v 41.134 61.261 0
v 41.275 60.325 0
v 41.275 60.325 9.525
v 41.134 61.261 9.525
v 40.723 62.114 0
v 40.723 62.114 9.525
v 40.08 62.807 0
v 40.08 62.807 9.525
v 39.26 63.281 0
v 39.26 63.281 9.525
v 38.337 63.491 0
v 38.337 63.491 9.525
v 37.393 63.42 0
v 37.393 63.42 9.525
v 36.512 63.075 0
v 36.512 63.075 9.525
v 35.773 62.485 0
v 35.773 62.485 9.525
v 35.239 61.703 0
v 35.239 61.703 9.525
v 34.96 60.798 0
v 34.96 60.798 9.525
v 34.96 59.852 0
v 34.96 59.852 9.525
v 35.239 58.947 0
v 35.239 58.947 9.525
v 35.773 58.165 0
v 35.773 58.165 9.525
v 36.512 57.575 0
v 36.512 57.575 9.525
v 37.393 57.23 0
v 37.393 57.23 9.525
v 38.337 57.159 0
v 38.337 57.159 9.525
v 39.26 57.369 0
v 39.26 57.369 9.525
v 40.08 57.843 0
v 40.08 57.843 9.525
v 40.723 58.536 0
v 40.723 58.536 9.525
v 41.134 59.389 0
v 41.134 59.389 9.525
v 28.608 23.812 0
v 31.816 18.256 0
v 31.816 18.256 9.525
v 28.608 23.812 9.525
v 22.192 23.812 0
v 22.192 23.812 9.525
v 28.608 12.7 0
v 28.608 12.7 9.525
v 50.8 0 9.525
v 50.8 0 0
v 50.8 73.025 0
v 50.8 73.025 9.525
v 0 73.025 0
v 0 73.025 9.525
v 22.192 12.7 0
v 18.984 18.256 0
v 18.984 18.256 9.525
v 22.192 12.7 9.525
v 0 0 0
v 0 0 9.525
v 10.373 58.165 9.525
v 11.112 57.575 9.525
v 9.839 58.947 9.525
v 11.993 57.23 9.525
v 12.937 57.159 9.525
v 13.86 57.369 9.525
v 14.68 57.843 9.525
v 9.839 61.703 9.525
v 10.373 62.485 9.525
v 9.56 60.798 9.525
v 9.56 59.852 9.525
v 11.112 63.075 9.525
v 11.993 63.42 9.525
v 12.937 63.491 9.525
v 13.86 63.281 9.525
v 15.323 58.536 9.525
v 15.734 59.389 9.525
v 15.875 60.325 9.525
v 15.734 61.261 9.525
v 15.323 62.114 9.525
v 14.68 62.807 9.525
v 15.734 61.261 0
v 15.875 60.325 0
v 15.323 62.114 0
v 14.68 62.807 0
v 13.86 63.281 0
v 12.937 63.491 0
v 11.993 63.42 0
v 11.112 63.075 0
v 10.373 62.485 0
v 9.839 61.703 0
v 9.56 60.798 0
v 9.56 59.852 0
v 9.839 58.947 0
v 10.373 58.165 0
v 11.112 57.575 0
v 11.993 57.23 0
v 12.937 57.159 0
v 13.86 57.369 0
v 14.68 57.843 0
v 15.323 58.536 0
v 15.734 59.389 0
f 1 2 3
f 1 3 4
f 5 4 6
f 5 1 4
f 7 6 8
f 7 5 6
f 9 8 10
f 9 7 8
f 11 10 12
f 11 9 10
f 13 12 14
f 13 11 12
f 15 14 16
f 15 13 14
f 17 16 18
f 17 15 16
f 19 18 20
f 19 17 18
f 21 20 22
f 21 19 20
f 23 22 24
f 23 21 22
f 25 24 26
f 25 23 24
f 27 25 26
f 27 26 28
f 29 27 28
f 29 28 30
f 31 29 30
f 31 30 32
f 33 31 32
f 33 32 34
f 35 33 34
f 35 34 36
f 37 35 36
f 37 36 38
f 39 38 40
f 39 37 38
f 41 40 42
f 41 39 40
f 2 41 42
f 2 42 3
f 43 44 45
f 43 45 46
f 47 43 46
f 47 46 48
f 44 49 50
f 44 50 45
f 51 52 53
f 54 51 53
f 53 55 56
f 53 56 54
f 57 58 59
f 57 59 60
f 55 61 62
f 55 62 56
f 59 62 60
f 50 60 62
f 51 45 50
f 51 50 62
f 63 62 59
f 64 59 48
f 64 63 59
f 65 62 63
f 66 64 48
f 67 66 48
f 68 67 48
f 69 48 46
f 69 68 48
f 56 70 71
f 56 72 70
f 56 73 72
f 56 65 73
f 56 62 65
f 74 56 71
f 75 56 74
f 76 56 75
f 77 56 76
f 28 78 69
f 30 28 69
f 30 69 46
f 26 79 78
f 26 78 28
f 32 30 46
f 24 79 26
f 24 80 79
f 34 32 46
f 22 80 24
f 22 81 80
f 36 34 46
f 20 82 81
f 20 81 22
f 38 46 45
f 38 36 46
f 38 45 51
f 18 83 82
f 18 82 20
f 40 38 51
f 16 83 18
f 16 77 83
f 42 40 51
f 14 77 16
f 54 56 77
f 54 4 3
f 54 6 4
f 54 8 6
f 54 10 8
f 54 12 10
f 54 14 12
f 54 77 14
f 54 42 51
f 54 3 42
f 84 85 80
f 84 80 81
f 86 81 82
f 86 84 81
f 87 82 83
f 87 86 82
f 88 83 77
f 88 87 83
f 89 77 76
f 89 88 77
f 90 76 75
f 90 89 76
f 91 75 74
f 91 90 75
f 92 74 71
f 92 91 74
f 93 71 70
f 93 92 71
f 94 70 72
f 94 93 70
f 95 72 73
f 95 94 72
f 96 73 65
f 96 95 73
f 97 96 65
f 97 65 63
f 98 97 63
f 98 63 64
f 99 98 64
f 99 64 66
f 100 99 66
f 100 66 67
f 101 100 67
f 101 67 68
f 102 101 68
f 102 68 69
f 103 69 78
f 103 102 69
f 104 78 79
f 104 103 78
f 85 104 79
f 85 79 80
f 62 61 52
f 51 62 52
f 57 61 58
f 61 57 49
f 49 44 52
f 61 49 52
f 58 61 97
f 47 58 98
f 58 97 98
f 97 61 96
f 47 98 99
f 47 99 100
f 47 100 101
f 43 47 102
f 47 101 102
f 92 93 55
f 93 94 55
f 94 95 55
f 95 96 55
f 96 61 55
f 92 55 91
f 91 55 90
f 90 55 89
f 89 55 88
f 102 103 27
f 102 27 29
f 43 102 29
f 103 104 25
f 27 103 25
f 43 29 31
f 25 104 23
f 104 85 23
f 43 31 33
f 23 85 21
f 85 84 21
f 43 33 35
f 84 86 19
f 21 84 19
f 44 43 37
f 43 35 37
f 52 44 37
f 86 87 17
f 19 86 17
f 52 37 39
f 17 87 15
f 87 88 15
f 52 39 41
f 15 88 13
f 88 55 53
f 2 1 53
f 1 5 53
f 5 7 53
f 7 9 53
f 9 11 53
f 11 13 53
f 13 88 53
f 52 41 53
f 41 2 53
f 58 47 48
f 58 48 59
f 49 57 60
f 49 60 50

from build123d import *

# Parameters (mm, degrees)
SKETCH2_W      = 50.8
SKETCH2_H      = 73.025
SKETCH2_R      = 3.175
EXTRUDE1_DEPTH = 9.525


with BuildPart() as part:
    # Sketch2 → Extrude1 (new body)
    with BuildSketch(Plane.XY):
        with Locations((25.4, 36.5125)):
            Rectangle(SKETCH2_W, SKETCH2_H)
        with Locations((12.7, 60.325)):
            Circle(SKETCH2_R, mode=Mode.SUBTRACT)
        with Locations((38.1, 60.325)):
            Circle(SKETCH2_R, mode=Mode.SUBTRACT)
        Polygon((31.815804866, 18.25625), (28.607902433, 23.8125), (22.192097567, 23.8125), (18.984195134, 18.25625), (22.192097567, 12.7), (28.607902433, 12.7), align=None, mode=Mode.SUBTRACT)
    extrude(amount=EXTRUDE1_DEPTH)


solid = part.part
